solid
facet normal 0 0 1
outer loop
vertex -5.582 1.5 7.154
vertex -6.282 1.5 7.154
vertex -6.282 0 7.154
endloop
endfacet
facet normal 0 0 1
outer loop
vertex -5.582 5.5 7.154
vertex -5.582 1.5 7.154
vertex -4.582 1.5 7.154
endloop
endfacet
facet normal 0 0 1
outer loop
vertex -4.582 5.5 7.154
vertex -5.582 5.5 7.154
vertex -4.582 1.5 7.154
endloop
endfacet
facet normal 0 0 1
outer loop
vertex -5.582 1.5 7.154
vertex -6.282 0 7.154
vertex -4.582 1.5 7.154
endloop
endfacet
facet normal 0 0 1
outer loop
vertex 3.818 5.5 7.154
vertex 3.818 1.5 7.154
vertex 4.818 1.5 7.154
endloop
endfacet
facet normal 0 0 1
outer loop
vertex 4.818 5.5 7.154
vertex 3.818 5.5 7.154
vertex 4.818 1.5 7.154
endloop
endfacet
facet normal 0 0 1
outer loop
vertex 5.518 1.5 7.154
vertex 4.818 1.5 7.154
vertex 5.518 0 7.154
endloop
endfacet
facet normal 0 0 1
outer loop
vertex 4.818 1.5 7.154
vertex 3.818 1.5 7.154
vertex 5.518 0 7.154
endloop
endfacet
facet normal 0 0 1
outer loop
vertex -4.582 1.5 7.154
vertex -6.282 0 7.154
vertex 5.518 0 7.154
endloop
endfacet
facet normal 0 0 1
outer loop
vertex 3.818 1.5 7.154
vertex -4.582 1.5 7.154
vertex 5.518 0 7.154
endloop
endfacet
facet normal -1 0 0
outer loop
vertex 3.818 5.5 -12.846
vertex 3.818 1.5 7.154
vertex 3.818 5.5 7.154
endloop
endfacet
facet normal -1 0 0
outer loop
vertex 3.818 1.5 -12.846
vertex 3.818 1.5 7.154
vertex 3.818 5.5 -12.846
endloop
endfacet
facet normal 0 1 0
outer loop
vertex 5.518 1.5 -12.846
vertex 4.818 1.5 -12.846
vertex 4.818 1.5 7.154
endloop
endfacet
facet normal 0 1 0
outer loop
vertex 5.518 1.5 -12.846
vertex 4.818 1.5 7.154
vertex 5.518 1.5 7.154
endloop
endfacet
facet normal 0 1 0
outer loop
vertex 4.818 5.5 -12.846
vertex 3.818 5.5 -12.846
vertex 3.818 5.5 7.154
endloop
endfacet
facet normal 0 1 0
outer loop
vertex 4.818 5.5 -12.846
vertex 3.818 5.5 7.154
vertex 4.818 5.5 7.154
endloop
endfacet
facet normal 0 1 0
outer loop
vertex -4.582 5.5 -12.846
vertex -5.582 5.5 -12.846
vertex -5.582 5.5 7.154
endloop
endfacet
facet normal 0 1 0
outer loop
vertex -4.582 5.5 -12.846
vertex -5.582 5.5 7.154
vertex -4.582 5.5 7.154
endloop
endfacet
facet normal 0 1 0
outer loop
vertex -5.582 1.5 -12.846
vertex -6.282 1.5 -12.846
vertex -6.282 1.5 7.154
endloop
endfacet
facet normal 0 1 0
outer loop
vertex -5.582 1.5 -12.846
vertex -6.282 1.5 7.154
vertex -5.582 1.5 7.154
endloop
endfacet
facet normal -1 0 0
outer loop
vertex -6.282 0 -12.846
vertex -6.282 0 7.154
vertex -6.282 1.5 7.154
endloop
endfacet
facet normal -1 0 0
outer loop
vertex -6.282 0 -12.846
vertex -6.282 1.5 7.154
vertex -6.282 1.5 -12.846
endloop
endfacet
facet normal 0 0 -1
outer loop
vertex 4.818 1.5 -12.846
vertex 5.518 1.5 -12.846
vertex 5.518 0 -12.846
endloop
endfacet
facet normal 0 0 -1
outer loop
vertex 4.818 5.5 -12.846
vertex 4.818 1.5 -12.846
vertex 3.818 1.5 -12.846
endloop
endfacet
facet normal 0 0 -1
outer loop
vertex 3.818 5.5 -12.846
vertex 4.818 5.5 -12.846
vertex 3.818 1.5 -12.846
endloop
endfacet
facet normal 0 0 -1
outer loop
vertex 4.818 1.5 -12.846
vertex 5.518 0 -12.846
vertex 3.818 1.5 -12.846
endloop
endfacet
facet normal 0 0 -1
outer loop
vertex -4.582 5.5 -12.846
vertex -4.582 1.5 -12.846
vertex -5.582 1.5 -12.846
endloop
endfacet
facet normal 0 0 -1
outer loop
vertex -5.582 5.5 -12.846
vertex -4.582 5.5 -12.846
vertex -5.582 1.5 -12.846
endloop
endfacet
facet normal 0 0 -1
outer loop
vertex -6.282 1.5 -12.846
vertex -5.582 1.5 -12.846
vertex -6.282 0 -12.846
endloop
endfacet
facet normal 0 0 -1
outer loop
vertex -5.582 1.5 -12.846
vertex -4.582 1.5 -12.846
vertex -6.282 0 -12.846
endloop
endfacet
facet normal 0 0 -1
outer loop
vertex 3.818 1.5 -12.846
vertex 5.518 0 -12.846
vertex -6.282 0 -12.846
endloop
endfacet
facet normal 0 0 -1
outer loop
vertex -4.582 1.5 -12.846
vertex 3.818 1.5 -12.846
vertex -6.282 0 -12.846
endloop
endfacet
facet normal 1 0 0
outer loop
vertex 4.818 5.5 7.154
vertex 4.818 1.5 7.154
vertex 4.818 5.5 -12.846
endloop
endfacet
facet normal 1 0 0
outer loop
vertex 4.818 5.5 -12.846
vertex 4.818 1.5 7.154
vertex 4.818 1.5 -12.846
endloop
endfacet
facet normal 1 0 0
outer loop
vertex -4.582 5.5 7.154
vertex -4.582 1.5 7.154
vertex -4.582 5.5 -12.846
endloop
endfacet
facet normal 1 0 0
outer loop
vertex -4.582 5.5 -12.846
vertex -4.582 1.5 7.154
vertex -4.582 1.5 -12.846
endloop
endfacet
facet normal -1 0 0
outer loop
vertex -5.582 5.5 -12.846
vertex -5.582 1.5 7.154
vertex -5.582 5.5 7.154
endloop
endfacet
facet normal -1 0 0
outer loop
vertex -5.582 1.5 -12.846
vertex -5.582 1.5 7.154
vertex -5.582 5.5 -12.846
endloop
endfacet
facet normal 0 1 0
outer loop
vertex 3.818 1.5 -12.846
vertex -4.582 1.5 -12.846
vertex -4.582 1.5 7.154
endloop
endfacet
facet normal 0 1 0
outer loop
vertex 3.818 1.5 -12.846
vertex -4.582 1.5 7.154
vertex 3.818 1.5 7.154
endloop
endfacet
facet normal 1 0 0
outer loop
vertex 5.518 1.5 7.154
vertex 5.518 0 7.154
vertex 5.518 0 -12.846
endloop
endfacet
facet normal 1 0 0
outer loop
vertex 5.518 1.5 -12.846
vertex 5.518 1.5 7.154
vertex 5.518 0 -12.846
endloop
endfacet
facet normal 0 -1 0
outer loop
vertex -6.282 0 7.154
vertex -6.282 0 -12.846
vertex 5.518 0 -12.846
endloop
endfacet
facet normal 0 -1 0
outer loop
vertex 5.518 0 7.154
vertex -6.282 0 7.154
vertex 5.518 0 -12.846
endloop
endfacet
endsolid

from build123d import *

# Parameters (mm, degrees)
SKETCH1_W           = 0.7
SKETCH1_H           = 20
SKETCH1_W_2         = 1
SKETCH1_W_3         = 8.4
BOSS_EXTRUDE1_DEPTH = 1.5
BOSS_EXTRUDE2_START = 1.5
SKETCH1_3_W         = 1
SKETCH1_3_H         = 20
BOSS_EXTRUDE2_DEPTH = 4


with BuildPart() as part:
    # Sketch1 → Boss-Extrude1 (new body)
    with BuildSketch(Plane(origin=(0, 0, 0), x_dir=(1, 0, 0), z_dir=(0, 1, 0))):
        with Locations((-5.931879195, 2.845637584)):
            Rectangle(SKETCH1_W, SKETCH1_H)
        with Locations((-5.081879195, 2.845637584)):
            Rectangle(SKETCH1_W_2, SKETCH1_H)
        with Locations((-0.381879195, 2.845637584)):
            Rectangle(SKETCH1_W_3, SKETCH1_H)
        with Locations((4.318120805, 2.845637584)):
            Rectangle(SKETCH1_W_2, SKETCH1_H)
        with Locations((5.168120805, 2.845637584)):
            Rectangle(SKETCH1_W, SKETCH1_H)
    extrude(amount=BOSS_EXTRUDE1_DEPTH)

    # Sketch1<3> → Boss-Extrude2 (add)
    with BuildSketch(Plane(origin=(0, 0, 0), x_dir=(1, 0, 0), z_dir=(0, 1, 0)).offset(BOSS_EXTRUDE2_START)):
        with Locations((-5.081879195, 2.845637584)):
            Rectangle(SKETCH1_3_W, SKETCH1_3_H)
        with Locations((4.318120805, 2.845637584)):
            Rectangle(SKETCH1_3_W, SKETCH1_3_H)
    extrude(amount=BOSS_EXTRUDE2_DEPTH)


solid = part.part
